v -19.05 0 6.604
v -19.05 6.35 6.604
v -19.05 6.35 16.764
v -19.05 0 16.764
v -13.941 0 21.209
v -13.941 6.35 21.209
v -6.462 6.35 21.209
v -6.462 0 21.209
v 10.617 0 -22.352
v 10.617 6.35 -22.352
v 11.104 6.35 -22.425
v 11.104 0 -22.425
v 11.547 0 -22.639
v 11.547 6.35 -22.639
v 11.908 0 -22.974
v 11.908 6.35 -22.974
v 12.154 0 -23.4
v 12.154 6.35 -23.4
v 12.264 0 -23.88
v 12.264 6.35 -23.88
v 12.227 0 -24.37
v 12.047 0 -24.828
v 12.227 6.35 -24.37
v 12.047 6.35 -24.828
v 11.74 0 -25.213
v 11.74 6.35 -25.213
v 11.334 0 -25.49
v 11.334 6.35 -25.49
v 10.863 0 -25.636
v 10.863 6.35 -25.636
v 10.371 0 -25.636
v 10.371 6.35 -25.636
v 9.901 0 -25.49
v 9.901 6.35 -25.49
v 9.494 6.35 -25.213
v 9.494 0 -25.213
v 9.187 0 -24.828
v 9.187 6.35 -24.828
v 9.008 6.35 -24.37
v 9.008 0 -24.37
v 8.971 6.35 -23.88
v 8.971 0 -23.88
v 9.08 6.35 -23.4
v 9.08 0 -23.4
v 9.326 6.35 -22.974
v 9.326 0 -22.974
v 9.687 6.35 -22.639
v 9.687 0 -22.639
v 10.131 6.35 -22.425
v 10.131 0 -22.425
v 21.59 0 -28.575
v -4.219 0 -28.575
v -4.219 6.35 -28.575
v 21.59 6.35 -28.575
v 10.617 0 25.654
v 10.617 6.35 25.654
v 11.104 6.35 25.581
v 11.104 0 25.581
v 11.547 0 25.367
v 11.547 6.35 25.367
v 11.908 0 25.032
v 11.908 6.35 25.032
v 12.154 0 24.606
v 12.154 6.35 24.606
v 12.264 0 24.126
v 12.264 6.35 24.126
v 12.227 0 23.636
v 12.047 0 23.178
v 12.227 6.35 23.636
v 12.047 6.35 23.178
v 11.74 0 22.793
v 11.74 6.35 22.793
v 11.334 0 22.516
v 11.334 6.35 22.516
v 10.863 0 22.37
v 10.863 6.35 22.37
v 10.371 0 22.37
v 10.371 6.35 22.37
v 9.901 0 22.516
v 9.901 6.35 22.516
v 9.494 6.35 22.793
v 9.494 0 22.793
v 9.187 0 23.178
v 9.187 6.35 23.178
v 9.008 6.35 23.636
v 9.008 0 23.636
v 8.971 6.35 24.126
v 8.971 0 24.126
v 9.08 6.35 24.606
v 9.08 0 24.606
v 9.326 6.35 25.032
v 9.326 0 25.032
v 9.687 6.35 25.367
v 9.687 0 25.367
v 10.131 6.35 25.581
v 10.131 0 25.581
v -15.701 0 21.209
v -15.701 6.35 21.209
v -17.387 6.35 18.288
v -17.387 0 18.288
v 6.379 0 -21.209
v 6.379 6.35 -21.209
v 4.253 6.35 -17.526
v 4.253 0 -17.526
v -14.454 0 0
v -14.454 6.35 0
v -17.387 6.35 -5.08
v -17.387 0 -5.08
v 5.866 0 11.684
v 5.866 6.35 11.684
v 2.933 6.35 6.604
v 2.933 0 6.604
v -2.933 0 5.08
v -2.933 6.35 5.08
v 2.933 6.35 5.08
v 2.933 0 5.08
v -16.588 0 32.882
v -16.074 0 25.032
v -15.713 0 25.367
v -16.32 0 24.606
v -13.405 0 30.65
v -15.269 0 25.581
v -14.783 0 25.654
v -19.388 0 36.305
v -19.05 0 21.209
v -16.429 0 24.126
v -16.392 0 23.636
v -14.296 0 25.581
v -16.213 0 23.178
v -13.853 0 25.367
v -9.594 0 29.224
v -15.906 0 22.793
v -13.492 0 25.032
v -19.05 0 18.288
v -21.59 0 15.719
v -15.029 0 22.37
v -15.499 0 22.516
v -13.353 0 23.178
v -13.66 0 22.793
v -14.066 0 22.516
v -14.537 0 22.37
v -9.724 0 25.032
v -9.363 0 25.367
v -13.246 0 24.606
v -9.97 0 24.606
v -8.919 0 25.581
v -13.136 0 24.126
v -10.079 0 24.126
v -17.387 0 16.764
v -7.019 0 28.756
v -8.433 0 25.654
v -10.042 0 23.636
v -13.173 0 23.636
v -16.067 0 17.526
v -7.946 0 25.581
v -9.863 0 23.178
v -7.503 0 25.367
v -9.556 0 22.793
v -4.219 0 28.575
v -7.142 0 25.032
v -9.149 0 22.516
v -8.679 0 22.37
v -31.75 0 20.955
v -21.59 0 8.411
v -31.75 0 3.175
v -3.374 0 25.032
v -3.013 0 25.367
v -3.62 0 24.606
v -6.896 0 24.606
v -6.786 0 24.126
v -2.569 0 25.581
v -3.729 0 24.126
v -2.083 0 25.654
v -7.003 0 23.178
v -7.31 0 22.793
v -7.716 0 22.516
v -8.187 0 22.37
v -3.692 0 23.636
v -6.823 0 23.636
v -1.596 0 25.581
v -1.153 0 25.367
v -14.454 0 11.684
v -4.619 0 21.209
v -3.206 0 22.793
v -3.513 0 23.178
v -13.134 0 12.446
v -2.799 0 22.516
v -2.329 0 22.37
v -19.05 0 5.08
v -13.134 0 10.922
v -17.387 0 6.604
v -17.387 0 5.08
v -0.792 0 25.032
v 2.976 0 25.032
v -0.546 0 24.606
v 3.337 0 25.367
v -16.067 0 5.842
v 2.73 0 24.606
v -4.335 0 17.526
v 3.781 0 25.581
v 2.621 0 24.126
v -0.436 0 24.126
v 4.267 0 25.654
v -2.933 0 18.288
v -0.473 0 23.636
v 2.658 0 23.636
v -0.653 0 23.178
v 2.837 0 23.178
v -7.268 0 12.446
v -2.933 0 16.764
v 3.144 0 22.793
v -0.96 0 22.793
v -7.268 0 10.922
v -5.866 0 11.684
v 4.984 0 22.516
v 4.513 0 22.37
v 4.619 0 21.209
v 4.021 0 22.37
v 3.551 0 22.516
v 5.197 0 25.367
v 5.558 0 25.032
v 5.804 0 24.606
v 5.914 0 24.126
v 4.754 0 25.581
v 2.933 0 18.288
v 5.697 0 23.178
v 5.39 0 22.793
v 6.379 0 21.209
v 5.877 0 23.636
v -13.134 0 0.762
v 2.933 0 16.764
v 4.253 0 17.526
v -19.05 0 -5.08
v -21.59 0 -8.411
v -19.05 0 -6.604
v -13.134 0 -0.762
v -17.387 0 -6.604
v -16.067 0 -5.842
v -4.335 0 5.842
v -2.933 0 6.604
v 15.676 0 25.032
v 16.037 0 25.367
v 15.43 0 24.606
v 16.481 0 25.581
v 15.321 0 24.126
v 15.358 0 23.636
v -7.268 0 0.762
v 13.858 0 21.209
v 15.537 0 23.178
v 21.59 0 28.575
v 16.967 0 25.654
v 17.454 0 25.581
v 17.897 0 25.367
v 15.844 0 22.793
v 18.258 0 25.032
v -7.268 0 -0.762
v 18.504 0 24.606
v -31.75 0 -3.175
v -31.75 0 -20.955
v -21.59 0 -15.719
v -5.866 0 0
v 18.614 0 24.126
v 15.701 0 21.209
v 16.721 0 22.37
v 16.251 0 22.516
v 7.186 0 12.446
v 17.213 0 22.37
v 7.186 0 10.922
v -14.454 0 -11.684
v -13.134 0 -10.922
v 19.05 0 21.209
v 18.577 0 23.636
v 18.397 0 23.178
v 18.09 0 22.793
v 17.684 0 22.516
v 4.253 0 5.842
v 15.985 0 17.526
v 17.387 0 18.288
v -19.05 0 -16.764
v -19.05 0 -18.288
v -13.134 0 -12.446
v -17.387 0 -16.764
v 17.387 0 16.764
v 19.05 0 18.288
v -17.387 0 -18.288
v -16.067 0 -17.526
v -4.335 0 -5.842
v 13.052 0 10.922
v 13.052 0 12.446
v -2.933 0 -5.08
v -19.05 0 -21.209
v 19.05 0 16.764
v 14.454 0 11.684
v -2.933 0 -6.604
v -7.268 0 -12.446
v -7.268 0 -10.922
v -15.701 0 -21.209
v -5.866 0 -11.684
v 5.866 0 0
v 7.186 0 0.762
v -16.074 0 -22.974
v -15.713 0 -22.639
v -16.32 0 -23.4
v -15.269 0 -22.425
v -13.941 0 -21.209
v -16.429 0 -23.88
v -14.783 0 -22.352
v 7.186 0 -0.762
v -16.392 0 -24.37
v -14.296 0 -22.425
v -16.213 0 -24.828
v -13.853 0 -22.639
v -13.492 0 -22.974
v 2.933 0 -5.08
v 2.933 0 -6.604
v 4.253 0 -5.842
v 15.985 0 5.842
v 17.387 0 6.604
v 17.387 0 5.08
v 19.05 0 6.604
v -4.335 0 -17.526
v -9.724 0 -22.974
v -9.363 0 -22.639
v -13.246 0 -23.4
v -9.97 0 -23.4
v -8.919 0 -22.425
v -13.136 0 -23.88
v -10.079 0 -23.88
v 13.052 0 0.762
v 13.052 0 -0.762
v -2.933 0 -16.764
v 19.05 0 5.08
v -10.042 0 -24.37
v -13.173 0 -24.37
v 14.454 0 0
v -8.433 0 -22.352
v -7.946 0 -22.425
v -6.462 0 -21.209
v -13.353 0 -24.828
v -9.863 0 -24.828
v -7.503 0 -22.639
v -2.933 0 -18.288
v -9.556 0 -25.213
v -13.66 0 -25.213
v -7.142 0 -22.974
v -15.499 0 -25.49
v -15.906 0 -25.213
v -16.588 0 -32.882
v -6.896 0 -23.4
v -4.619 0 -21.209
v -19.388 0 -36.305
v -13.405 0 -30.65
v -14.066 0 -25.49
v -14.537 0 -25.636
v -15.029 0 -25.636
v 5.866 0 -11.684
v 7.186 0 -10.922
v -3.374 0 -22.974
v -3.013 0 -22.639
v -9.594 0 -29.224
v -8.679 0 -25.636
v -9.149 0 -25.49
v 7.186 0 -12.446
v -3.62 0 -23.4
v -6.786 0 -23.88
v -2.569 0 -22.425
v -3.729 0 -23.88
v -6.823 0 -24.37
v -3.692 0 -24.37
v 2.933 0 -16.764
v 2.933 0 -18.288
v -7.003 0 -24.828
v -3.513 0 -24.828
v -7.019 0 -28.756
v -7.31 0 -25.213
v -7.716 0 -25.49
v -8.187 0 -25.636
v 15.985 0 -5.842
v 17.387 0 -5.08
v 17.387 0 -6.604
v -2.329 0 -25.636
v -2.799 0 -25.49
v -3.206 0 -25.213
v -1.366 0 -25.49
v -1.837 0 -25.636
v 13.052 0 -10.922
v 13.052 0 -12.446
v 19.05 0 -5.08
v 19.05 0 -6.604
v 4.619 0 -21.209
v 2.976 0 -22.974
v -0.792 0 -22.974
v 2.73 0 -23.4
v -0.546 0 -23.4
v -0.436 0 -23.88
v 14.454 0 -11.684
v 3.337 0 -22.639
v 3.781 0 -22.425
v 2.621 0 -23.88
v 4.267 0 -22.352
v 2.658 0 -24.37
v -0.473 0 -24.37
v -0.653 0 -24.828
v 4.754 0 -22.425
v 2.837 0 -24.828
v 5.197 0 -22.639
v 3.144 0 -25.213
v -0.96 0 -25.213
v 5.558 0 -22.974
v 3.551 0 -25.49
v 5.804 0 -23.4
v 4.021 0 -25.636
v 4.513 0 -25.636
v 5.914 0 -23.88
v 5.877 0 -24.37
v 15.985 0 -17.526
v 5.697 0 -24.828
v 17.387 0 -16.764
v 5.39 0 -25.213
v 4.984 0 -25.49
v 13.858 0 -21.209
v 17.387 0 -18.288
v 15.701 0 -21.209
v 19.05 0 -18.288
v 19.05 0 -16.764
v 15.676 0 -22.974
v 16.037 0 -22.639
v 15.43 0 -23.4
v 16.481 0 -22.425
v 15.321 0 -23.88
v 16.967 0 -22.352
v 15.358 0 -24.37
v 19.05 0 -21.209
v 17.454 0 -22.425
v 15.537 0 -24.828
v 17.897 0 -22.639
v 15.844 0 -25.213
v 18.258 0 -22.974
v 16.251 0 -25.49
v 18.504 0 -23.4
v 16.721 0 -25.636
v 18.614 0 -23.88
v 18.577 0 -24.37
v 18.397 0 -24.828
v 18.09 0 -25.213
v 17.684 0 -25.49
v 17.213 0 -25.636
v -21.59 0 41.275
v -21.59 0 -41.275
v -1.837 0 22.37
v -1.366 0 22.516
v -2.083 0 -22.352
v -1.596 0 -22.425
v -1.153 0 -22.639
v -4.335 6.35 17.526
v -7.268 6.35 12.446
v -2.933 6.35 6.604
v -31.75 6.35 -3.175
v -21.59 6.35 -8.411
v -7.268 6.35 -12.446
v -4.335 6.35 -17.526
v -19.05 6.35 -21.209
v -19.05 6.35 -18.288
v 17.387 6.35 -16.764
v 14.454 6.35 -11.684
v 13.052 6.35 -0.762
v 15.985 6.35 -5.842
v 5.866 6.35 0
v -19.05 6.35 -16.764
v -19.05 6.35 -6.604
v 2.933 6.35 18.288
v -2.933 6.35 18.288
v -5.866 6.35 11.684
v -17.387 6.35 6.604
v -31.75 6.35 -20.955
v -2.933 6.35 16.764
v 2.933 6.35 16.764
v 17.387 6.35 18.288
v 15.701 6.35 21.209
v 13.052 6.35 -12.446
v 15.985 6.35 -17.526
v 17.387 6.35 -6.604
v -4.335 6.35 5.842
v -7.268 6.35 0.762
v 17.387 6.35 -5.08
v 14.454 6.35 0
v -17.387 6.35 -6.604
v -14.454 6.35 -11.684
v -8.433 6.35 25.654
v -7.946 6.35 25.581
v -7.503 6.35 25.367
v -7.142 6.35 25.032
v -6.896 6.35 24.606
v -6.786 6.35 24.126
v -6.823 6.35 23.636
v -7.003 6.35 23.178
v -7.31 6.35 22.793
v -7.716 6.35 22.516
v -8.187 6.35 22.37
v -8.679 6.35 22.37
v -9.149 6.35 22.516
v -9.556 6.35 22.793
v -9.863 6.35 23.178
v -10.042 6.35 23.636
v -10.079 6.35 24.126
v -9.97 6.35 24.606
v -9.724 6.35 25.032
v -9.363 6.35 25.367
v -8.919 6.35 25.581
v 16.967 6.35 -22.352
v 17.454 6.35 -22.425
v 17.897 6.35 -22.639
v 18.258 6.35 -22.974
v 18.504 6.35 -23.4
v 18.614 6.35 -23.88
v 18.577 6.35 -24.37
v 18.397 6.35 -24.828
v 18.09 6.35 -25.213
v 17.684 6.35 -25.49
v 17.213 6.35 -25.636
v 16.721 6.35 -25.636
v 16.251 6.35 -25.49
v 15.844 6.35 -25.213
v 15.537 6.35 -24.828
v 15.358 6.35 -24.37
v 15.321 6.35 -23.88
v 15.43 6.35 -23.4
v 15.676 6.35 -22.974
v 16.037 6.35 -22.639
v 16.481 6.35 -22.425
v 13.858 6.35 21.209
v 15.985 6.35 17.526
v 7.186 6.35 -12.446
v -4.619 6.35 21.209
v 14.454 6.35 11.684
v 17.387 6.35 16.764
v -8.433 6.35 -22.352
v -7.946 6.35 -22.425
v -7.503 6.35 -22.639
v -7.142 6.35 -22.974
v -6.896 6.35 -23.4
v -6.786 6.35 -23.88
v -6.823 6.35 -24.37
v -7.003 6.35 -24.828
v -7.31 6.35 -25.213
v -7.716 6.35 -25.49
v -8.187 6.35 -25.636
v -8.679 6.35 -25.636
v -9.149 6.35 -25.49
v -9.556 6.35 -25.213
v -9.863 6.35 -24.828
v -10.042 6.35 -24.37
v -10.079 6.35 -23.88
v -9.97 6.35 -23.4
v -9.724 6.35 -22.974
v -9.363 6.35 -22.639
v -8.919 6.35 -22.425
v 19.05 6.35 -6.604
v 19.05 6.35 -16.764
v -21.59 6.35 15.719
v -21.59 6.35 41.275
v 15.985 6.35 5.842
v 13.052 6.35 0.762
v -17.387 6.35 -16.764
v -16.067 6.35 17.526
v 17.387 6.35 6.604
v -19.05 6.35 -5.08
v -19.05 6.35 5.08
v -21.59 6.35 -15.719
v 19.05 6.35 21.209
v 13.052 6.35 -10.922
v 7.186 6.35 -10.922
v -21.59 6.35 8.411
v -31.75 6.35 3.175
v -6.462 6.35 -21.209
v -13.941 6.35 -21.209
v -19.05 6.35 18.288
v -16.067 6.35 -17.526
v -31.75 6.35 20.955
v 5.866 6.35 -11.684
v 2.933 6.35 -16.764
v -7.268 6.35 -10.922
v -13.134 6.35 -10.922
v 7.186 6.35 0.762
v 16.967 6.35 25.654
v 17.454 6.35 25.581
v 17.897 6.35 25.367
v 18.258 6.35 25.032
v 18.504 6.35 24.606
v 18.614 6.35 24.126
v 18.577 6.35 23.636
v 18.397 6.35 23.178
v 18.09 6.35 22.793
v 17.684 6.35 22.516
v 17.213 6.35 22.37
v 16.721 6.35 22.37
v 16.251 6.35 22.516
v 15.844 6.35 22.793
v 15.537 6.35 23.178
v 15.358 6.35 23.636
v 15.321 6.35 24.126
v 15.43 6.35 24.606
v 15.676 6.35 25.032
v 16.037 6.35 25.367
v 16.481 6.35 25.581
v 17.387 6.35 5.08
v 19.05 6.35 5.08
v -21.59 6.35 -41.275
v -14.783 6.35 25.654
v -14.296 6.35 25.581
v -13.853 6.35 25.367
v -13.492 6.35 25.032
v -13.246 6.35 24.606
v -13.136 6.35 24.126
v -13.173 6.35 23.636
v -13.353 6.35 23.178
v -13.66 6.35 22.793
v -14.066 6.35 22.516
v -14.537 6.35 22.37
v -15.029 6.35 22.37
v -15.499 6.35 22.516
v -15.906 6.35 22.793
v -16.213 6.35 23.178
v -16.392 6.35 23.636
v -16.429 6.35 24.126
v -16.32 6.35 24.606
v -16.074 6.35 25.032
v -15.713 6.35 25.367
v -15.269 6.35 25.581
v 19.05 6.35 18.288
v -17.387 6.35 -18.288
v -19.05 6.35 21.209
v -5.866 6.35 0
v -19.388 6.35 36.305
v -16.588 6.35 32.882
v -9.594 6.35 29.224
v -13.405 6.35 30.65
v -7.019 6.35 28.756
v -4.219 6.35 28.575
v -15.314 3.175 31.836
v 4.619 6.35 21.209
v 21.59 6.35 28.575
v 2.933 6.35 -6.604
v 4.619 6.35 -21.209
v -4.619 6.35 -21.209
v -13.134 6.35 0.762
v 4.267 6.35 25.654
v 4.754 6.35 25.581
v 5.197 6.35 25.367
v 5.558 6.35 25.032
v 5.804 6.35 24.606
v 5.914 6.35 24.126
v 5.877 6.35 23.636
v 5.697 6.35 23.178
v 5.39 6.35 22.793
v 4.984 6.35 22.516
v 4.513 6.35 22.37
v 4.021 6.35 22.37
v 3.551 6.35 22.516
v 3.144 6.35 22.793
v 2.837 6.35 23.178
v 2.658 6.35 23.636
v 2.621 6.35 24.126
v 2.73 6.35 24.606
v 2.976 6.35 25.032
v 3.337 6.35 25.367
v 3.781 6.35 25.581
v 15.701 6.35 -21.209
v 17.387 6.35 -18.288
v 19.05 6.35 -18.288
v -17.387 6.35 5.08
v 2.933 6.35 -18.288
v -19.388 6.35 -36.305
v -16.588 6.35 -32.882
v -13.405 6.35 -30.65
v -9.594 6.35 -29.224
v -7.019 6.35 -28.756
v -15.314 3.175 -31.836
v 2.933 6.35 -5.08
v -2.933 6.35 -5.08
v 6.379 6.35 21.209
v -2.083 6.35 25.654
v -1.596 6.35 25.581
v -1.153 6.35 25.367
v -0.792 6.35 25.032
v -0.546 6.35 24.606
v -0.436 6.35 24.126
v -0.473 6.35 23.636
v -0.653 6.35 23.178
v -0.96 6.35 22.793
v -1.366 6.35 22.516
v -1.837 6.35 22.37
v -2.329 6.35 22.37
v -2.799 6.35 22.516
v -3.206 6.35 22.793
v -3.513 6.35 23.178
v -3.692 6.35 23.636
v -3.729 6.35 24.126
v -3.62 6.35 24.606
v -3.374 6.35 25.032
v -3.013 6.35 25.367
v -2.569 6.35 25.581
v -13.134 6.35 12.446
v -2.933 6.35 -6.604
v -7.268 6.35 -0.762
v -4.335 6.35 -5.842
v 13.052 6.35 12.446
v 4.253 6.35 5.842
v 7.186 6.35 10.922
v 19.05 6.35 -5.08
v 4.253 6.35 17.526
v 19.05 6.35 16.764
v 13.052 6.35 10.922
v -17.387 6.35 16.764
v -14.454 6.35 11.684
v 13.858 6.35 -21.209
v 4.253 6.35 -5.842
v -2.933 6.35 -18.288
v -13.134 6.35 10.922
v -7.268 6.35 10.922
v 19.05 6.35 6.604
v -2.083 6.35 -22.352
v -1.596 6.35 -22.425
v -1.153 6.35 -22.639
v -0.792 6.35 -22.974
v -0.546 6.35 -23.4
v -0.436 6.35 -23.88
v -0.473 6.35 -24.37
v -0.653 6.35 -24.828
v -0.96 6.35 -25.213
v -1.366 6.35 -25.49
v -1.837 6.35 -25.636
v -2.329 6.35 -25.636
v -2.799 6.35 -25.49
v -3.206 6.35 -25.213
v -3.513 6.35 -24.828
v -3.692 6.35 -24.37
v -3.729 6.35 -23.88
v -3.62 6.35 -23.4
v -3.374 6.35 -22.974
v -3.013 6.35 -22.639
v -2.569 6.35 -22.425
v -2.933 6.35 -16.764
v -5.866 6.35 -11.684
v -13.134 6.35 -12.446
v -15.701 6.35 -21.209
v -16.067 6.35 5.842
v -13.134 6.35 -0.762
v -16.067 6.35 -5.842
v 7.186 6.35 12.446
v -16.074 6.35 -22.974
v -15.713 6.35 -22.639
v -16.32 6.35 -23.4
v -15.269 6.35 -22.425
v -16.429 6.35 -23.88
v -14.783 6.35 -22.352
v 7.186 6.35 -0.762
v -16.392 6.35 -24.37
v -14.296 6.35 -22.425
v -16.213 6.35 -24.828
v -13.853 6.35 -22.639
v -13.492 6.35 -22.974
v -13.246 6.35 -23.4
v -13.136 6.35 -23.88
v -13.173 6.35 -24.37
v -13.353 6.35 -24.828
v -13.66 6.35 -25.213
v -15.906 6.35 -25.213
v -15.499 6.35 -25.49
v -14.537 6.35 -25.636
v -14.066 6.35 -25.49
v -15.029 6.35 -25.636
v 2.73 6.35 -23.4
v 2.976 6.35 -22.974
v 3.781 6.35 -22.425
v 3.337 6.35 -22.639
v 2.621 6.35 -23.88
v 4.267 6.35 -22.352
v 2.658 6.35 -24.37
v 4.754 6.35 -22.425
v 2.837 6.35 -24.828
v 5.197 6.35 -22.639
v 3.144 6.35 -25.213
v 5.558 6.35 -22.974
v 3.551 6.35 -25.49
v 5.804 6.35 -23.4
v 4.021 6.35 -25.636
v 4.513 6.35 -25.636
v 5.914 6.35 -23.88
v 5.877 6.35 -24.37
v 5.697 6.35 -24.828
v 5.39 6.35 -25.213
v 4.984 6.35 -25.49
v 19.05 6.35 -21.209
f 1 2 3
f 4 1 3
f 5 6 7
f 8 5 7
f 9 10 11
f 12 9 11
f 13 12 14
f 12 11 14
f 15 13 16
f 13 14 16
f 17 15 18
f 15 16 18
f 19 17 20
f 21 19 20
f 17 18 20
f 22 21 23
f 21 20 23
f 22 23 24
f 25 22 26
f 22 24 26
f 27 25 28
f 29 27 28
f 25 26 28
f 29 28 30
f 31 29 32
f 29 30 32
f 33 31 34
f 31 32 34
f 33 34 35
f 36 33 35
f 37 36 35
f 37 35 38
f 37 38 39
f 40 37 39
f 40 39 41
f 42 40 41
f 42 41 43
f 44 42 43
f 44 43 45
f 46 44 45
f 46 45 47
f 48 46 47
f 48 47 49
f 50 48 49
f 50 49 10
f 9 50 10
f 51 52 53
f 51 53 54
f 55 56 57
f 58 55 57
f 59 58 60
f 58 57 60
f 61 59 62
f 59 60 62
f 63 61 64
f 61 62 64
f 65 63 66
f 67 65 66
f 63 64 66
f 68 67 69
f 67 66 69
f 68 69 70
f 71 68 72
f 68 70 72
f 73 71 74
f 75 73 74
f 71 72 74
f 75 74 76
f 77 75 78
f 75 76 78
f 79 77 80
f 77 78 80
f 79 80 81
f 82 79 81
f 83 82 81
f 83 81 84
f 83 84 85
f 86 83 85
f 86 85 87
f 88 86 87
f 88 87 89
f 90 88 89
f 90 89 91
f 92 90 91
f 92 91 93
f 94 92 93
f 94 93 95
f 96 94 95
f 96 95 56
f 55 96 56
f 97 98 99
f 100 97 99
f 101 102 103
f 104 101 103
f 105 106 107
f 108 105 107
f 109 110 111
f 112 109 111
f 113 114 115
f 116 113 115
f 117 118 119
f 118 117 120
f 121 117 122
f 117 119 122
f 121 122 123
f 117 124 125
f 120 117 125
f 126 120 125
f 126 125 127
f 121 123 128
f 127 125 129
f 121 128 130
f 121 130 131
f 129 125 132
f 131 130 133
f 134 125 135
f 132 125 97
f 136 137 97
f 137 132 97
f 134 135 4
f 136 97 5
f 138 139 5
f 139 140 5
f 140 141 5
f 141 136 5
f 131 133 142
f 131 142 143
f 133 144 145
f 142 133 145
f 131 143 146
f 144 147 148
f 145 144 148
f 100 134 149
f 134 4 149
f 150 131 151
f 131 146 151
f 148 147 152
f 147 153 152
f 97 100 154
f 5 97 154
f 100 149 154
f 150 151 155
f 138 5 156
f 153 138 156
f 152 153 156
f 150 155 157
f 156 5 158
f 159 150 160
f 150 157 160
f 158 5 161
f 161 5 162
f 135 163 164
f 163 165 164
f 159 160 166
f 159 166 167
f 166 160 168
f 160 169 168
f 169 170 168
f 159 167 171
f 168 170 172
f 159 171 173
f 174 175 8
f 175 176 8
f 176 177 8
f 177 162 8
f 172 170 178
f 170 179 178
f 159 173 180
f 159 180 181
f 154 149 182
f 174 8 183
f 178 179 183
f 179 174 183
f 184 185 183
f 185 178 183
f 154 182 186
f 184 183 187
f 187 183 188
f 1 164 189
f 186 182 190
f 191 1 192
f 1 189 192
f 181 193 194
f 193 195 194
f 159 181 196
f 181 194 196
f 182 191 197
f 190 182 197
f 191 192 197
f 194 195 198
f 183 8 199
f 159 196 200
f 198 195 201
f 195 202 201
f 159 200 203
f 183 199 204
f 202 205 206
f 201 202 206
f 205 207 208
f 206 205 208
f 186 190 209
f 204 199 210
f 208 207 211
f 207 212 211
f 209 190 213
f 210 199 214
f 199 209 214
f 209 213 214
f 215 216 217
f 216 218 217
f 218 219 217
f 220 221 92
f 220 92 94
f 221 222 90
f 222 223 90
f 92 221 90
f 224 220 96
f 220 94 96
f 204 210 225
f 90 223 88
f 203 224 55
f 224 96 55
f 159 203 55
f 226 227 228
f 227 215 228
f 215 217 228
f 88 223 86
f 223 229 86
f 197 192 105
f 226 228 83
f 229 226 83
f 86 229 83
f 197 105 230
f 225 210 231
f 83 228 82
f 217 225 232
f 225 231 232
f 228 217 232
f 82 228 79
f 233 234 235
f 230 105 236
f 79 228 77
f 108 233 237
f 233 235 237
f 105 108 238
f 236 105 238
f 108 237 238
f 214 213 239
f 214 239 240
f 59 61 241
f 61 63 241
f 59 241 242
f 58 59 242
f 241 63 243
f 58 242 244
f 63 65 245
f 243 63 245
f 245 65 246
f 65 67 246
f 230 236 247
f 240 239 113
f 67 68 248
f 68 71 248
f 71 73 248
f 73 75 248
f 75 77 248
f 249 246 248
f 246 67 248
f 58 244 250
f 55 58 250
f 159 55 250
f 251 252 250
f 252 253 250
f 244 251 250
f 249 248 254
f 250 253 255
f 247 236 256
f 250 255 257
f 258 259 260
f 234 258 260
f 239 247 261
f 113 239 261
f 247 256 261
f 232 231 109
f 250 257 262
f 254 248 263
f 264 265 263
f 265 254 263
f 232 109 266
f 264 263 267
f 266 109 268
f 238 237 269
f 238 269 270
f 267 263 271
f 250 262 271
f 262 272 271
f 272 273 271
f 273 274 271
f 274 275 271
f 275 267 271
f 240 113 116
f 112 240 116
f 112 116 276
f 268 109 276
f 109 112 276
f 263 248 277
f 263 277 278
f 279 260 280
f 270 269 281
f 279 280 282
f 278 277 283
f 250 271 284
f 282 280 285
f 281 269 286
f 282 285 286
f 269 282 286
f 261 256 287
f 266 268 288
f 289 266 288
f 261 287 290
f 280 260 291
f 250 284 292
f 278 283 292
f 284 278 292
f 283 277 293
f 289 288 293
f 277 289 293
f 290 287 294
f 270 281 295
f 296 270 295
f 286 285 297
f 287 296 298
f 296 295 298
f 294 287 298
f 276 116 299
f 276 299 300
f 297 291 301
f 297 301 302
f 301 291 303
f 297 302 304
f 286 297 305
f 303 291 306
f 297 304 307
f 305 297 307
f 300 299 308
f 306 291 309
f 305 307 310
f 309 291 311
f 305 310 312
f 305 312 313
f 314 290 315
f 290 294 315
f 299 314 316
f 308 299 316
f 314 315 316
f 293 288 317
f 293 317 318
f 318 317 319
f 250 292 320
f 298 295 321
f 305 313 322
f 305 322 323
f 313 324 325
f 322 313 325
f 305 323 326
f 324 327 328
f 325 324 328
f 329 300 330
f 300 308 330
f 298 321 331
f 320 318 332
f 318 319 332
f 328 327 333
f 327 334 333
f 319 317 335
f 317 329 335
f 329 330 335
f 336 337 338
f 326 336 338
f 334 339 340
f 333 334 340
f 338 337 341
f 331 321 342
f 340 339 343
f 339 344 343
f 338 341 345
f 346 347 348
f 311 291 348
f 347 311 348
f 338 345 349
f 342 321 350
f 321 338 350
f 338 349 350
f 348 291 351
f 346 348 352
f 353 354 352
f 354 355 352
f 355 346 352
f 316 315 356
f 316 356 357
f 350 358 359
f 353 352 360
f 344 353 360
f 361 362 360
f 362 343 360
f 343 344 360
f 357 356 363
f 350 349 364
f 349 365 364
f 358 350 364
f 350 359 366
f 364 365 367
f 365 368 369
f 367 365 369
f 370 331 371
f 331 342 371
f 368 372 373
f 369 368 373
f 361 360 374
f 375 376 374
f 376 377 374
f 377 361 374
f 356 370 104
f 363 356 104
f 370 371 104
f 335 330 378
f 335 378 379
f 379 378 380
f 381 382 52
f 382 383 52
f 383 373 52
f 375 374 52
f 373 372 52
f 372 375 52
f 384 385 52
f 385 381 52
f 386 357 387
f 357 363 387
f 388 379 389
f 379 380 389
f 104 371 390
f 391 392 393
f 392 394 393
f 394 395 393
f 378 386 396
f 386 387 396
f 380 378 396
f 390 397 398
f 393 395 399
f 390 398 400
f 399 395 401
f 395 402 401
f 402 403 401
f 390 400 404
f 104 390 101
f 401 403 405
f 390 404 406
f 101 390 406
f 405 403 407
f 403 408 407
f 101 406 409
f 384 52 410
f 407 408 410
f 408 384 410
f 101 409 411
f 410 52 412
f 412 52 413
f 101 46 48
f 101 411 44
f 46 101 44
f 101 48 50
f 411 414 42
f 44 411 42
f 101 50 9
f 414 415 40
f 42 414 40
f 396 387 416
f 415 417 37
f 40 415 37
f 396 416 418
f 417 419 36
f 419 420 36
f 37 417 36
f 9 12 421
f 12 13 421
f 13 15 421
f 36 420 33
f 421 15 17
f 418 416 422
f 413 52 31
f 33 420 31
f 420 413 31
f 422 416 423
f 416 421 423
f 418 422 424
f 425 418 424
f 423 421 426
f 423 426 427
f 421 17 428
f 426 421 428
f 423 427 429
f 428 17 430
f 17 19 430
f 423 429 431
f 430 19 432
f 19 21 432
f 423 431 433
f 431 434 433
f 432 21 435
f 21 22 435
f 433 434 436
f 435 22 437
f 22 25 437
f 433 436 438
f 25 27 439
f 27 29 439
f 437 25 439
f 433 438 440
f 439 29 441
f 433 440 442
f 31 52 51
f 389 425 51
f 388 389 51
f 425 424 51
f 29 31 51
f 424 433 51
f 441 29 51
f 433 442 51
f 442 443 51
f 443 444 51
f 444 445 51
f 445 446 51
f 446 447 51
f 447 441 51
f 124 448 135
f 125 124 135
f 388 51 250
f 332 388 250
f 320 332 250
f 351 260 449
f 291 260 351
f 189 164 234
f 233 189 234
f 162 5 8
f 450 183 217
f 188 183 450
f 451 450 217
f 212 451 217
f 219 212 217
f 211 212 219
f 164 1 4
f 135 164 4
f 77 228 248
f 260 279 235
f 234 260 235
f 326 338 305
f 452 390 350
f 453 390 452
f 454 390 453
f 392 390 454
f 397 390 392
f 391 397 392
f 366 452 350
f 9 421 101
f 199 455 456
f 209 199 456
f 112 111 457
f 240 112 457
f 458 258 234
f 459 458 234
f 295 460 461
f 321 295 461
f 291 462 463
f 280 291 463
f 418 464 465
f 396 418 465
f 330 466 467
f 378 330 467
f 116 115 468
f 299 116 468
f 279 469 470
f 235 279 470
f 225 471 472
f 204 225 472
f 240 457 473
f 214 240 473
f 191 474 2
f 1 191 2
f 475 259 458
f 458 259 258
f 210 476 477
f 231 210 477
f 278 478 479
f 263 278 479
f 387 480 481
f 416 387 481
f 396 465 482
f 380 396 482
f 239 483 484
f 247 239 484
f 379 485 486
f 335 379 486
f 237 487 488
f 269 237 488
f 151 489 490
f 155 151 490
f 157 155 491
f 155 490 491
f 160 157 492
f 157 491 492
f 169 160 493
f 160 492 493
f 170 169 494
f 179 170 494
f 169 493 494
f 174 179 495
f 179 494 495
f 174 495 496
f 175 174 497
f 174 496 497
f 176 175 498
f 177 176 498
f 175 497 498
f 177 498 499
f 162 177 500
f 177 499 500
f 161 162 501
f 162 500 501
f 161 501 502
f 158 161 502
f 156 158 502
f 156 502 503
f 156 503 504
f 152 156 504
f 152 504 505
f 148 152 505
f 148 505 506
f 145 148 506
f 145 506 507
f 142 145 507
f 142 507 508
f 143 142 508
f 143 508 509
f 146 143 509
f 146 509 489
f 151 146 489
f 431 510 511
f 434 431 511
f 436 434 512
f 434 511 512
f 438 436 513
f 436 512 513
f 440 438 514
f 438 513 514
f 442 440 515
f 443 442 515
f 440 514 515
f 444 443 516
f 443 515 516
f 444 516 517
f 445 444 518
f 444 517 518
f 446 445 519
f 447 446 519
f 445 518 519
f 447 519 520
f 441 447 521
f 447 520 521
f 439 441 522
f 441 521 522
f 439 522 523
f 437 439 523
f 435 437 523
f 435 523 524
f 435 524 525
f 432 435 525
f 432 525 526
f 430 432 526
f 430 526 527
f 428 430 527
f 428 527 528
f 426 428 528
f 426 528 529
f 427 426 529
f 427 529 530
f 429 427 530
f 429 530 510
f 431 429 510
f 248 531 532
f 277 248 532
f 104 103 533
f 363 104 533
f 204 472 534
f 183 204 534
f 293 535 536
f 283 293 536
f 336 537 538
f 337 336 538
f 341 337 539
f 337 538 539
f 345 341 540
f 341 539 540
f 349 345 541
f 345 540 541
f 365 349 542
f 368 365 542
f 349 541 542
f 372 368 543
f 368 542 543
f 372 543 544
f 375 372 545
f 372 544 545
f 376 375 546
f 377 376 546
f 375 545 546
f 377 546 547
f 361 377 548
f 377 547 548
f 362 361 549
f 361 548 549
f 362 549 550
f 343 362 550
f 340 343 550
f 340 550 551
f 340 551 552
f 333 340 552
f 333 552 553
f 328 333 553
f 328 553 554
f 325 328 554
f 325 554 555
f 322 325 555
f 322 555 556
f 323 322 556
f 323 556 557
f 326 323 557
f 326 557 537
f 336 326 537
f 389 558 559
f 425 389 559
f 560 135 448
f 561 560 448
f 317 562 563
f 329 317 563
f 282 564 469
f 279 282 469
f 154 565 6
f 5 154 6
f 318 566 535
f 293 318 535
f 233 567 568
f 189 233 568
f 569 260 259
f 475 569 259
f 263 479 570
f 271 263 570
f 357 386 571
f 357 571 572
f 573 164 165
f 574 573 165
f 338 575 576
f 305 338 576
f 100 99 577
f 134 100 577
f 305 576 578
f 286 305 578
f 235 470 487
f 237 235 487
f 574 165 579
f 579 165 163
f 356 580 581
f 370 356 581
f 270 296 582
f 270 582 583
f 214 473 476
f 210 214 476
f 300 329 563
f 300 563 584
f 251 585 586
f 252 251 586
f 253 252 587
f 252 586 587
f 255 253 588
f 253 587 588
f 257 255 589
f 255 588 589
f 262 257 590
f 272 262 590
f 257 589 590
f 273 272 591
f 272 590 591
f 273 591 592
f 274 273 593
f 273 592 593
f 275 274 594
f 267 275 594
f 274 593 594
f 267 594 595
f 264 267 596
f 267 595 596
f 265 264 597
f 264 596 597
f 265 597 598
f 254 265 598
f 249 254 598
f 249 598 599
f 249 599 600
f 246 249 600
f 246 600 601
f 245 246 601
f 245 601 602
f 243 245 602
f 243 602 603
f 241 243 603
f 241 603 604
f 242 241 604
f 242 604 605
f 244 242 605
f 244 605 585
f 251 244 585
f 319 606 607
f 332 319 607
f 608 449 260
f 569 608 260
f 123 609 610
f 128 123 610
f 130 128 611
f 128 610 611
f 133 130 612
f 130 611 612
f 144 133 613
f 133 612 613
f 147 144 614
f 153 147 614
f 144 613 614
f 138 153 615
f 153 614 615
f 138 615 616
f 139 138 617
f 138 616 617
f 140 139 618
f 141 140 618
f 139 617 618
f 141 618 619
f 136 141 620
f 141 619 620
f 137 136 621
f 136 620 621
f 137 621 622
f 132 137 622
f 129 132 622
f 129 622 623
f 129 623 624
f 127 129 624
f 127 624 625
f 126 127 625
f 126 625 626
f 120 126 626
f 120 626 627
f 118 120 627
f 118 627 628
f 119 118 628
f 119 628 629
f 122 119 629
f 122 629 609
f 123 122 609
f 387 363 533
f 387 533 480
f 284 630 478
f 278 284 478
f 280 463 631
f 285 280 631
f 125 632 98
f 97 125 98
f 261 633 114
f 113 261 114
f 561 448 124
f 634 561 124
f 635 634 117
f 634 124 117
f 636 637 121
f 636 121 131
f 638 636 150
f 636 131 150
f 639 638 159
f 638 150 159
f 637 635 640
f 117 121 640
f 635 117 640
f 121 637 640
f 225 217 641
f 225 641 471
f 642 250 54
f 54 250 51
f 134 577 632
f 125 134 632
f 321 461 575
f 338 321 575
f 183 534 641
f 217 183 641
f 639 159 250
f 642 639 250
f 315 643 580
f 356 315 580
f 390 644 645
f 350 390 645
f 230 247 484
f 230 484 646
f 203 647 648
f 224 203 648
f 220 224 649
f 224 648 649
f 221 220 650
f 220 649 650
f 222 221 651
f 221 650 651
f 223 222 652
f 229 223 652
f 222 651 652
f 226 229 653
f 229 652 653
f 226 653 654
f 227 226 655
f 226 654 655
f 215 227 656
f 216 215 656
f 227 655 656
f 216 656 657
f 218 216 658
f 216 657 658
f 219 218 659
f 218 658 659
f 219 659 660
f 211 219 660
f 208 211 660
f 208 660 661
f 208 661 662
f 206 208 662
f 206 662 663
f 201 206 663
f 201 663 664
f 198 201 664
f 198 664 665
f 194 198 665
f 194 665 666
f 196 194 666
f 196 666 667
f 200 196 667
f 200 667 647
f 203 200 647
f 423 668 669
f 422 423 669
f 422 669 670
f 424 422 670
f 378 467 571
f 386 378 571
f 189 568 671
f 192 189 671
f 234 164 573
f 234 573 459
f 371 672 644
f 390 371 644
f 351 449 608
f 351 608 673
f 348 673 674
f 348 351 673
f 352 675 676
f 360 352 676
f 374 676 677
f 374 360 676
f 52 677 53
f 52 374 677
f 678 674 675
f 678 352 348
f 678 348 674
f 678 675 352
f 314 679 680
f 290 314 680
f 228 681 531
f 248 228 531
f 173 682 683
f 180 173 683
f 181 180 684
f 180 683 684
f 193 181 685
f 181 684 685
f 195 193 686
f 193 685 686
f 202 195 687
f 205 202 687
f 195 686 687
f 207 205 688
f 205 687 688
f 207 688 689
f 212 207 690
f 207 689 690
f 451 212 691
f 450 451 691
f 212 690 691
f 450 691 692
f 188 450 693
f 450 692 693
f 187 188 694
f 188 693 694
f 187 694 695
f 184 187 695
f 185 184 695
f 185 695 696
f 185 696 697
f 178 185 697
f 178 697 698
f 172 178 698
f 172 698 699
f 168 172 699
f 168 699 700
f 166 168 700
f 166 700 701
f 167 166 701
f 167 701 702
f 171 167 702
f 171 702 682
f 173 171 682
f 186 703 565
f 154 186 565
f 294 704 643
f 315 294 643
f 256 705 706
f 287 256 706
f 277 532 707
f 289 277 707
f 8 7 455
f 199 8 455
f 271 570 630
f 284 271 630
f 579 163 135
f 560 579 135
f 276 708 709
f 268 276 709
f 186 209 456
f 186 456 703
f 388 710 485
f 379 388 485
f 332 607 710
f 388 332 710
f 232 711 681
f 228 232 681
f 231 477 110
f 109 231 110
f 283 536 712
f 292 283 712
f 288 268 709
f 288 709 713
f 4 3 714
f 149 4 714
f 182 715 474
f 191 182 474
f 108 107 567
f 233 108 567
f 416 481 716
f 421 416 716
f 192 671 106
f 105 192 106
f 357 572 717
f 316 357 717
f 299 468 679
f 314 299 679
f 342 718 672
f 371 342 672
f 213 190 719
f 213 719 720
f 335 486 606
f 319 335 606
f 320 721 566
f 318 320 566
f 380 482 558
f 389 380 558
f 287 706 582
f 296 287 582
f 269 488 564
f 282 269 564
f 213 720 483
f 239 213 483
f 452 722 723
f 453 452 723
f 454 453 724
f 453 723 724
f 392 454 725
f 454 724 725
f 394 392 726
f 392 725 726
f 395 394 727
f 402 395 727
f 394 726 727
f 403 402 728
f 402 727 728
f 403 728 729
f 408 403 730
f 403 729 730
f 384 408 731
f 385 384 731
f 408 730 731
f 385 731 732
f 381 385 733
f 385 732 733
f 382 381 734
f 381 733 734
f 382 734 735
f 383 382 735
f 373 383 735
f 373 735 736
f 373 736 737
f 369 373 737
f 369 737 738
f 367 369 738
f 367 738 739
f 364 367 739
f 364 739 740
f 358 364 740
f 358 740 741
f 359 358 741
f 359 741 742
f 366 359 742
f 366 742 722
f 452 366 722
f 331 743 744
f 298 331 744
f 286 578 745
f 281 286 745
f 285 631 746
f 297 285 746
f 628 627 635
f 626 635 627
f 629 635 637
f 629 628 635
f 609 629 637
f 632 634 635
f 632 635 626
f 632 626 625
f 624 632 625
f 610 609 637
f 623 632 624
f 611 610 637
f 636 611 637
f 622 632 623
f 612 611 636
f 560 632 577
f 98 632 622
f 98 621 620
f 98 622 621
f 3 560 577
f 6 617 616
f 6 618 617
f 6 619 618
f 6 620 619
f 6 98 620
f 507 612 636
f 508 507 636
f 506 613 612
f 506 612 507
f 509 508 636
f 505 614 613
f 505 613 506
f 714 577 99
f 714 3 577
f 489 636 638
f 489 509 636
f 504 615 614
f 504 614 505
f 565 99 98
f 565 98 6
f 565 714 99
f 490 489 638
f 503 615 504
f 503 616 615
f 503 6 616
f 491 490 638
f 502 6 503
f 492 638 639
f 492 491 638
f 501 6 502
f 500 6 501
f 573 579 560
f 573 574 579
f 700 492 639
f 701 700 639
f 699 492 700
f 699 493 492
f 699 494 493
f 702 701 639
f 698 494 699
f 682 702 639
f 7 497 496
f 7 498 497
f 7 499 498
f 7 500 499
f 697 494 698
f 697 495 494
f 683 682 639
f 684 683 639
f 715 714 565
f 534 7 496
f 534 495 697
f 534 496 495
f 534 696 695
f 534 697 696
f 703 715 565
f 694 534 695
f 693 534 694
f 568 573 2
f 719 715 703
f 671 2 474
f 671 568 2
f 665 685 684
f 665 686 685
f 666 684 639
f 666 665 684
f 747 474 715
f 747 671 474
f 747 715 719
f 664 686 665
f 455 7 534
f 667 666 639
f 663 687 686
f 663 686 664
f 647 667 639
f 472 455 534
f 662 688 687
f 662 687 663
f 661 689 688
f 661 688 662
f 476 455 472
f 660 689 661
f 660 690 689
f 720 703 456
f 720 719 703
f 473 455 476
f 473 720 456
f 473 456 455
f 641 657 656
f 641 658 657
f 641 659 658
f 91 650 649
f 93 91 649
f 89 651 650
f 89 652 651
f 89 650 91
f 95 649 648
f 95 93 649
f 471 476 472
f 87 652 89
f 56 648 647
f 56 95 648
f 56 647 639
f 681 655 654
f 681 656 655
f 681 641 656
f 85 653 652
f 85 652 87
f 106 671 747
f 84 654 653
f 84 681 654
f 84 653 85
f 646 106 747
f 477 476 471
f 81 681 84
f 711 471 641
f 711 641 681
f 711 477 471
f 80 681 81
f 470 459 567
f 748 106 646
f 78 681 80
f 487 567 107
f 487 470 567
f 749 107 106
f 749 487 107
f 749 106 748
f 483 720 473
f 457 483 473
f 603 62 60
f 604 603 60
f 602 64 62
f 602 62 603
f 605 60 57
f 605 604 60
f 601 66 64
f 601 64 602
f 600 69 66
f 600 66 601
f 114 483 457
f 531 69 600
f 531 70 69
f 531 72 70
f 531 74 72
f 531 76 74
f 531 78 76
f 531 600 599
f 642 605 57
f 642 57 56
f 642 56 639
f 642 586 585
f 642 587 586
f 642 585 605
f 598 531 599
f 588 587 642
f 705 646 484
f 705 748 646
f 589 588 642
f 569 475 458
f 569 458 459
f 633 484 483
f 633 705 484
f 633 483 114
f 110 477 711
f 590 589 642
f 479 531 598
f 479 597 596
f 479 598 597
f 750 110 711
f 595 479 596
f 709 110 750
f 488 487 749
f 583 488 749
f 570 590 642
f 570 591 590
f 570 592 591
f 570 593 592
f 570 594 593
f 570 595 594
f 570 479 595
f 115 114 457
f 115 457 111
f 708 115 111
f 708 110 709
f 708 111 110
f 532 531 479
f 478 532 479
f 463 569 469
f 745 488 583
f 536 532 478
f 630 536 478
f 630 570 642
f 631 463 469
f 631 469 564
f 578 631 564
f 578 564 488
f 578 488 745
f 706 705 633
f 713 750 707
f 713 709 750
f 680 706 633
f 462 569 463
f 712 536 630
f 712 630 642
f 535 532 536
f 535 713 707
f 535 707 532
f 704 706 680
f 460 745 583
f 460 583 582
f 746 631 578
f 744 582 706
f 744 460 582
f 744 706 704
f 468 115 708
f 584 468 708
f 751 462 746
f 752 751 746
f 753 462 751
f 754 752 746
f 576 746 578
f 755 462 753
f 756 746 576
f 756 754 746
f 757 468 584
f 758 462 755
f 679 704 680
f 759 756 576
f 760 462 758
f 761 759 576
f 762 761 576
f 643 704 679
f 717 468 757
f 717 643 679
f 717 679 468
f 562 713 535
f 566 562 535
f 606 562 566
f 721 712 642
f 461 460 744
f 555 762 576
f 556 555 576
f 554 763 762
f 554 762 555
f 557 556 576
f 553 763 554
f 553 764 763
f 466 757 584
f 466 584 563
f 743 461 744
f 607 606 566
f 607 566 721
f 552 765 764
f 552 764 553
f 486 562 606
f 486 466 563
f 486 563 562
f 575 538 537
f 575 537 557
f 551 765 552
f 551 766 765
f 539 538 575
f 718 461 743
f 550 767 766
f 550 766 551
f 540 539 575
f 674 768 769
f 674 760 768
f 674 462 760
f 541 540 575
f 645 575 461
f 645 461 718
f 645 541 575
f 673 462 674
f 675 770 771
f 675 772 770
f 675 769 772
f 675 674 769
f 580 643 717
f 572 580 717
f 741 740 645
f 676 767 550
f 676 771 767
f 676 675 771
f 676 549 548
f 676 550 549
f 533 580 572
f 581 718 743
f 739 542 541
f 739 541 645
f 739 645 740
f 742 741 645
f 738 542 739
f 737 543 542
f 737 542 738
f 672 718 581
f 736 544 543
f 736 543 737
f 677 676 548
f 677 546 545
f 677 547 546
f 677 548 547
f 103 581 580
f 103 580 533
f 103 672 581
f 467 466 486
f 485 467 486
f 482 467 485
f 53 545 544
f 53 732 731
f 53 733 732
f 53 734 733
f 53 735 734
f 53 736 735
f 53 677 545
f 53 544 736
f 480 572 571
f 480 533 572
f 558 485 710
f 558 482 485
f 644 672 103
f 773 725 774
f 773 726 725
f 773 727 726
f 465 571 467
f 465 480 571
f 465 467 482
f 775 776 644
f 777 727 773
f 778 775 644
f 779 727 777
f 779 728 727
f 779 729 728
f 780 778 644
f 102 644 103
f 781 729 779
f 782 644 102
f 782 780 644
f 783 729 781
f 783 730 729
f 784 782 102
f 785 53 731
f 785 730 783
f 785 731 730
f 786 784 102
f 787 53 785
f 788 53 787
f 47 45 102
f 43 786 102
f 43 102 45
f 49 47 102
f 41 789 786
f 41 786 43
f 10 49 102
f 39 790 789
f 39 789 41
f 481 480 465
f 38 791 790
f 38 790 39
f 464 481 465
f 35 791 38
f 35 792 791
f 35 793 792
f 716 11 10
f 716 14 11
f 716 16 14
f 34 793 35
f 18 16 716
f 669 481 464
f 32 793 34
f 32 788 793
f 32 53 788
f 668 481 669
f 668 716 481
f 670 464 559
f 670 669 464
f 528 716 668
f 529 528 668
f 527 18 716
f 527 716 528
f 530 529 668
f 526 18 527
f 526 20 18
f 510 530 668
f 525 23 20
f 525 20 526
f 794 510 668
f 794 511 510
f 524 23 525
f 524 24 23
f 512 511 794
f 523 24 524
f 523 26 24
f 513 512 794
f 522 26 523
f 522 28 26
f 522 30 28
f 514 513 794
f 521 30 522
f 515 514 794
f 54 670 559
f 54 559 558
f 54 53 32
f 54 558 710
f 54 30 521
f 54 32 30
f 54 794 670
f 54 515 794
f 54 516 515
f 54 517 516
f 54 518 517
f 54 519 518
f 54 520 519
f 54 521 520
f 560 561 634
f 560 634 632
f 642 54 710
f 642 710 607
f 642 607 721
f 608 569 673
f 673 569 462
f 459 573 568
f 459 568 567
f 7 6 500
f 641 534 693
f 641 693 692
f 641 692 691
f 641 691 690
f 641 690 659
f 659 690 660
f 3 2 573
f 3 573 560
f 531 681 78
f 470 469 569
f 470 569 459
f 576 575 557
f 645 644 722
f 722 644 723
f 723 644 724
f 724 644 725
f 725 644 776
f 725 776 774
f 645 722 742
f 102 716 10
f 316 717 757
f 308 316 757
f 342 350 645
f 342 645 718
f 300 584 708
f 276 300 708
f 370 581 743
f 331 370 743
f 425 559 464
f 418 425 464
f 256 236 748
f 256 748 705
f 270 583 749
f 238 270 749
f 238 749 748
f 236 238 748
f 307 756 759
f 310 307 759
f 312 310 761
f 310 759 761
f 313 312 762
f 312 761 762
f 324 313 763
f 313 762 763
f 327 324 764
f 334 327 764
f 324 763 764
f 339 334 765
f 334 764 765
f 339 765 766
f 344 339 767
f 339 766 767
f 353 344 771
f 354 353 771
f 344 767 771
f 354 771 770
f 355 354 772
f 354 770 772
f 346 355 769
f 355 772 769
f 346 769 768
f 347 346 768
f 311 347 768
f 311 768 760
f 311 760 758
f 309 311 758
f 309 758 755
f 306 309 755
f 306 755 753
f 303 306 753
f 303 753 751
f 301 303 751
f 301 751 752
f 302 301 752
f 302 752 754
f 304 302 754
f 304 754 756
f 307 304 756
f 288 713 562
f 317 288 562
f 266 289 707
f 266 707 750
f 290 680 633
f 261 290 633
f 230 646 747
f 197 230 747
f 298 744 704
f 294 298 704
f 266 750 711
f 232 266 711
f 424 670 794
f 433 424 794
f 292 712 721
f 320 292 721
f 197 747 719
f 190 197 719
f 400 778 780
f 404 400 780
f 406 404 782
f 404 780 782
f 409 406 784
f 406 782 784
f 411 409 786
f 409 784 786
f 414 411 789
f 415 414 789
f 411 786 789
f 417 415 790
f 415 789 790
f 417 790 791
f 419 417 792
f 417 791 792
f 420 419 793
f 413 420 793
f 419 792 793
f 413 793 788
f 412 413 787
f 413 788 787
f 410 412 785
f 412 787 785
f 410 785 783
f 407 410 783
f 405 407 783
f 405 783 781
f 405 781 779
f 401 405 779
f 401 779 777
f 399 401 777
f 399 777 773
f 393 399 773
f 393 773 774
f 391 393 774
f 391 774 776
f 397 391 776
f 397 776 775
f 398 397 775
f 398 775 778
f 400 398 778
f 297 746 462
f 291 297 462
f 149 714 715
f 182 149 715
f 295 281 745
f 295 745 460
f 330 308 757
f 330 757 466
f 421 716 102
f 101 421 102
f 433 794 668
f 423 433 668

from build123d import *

# Parameters (mm, degrees)
SKETCH1_W           = 43.18
SKETCH1_H           = 57.15
BOSS_EXTRUDE1_DEPTH = 6.35
SKETCH2_R           = 1.651
CUT_EXTRUDE1_DEPTH  = 53.459609614
CUT_EXTRUDE2_DEPTH  = 53.459609614


with BuildPart() as part:
    # Sketch1 → Boss-Extrude1 (new body)
    with BuildSketch(Plane(origin=(0, 0, 0), x_dir=(1, 0, 0), z_dir=(0, 1, 0))):
        Polygon((-31.75, -20.955), (-21.59, -15.718655855), (-21.59, -8.411344145), (-31.75, -3.175), align=None)
        Rectangle(SKETCH1_W, SKETCH1_H)
        Polygon((-31.75, 3.175), (-21.59, 8.411344145), (-21.59, 15.718655855), (-31.75, 20.955), align=None)
        with BuildLine():
            Line((-4.218626538, -28.575), (-21.59, -28.575))
            Line((-21.59, -28.575), (-21.59, -41.275))
            add(Edge.make_bspline(
                [(-21.59, -41.275), (-17.723032693, -28.747286936), (-4.218626538, -28.575)],
                knots=[0, 0, 0, 0.972868199, 0.972868199, 0.972868199], degree=2))
        make_face()
        with BuildLine():
            Line((-21.59, 41.275), (-21.59, 28.575))
            Line((-21.59, 28.575), (-4.218626538, 28.575))
            add(Edge.make_bspline(
                [(-21.59, 41.275), (-17.723032693, 28.747286936), (-4.218626538, 28.575)],
                knots=[0, 0, 0, 0.972868199, 0.972868199, 0.972868199], degree=2))
        make_face()
    extrude(amount=BOSS_EXTRUDE1_DEPTH)

    # Sketch2 → Cut-Extrude1 (cut, through all)
    with BuildSketch(Plane(origin=(0, 6.35, 0), x_dir=(1, 0, 0), z_dir=(0, 1, 0))):
        with Locations(Location((4.2672, 24.003, 0), (0, 0, 270))):
            Circle(SKETCH2_R)
        with Locations(Location((4.2672, -24.003, 0), (0, 0, 270))):
            Circle(SKETCH2_R)
        with Locations(Location((10.6172, 24.003, 0), (0, 0, 270))):
            Circle(SKETCH2_R)
        with Locations(Location((10.6172, -24.003, 0), (0, 0, 270))):
            Circle(SKETCH2_R)
        with Locations(Location((16.9672, 24.003, 0), (0, 0, 270))):
            Circle(SKETCH2_R)
        with Locations(Location((16.9672, -24.003, 0), (0, 0, 270))):
            Circle(SKETCH2_R)
        with Locations(Location((-2.0828, 24.003, 0), (0, 0, 270))):
            Circle(SKETCH2_R)
        with Locations(Location((-2.0828, -24.003, 0), (0, 0, 270))):
            Circle(SKETCH2_R)
        with Locations(Location((-8.4328, 24.003, 0), (0, 0, 270))):
            Circle(SKETCH2_R)
        with Locations(Location((-8.4328, -24.003, 0), (0, 0, 270))):
            Circle(SKETCH2_R)
        with Locations(Location((-14.7828, 24.003, 0), (0, 0, 270))):
            Circle(SKETCH2_R)
        with Locations(Location((-14.7828, -24.003, 0), (0, 0, 270))):
            Circle(SKETCH2_R)
    extrude(amount=-CUT_EXTRUDE1_DEPTH, mode=Mode.SUBTRACT)

    # Sketch3 → Cut-Extrude2 (cut, through all)
    with BuildSketch(Plane(origin=(0, 6.35, 0), x_dir=(1, 0, 0), z_dir=(0, 1, 0))):
        Polygon((-17.387060633, 18.288), (-15.700620496, 21.209), (-19.05, 21.209), (-19.05, 18.288), align=None)
        Polygon((-4.335480447, 17.526), (-6.461861489, 21.209), (-13.940856876, 21.209), (-16.067237917, 17.526), (-13.13429855, 12.446), (-7.268419815, 12.446), align=None)
        Polygon((-17.387060633, 16.764), (-19.05, 16.764), (-19.05, 6.604), (-17.387060633, 6.604), (-14.454121265, 11.684), align=None)
        Polygon((-16.067237917, 5.842), (-13.13429855, 0.762), (-7.268419815, 0.762), (-4.335480447, 5.842), (-7.268419815, 10.922), (-13.13429855, 10.922), align=None)
        Polygon((-17.387060633, 5.08), (-19.05, 5.08), (-19.05, -5.08), (-17.387060633, -5.08), (-14.454121265, 0), align=None)
        Polygon((-16.067237917, -5.842), (-13.13429855, -10.922), (-7.268419815, -10.922), (-4.335480447, -5.842), (-7.268419815, -0.762), (-13.13429855, -0.762), align=None)
        Polygon((-19.05, -6.604), (-19.05, -16.764), (-17.387060633, -16.764), (-14.454121265, -11.684), (-17.387060633, -6.604), align=None)
        Polygon((-13.940856876, -21.209), (-6.461861489, -21.209), (-4.335480447, -17.526), (-7.268419815, -12.446), (-13.13429855, -12.446), (-16.067237917, -17.526), align=None)
        Polygon((-19.05, -21.209), (-15.700620496, -21.209), (-17.387060633, -18.288), (-19.05, -18.288), align=None)
        Polygon((-4.619379504, -21.209), (4.619379504, -21.209), (2.932939367, -18.288), (-2.932939367, -18.288), align=None)
        Polygon((-2.932939367, -16.764), (2.932939367, -16.764), (5.865878735, -11.684), (2.932939367, -6.604), (-2.932939367, -6.604), (-5.865878735, -11.684), align=None)
        Polygon((-2.932939367, -5.08), (2.932939367, -5.08), (5.865878735, 0), (2.932939367, 5.08), (-2.932939367, 5.08), (-5.865878735, 0), align=None)
        Polygon((-2.932939367, 6.604), (2.932939367, 6.604), (5.865878735, 11.684), (2.932939367, 16.764), (-2.932939367, 16.764), (-5.865878735, 11.684), align=None)
        Polygon((2.932939367, 18.288), (4.619379504, 21.209), (-4.619379504, 21.209), (-2.932939367, 18.288), align=None)
        Polygon((15.984519553, 17.526), (13.858138511, 21.209), (6.379143124, 21.209), (4.252762083, 17.526), (7.18570145, 12.446), (13.051580185, 12.446), align=None)
        Polygon((17.387060633, 18.288), (19.05, 18.288), (19.05, 21.209), (15.700620496, 21.209), align=None)
        Polygon((17.387060633, 6.604), (19.05, 6.604), (19.05, 16.764), (17.387060633, 16.764), (14.454121265, 11.684), align=None)
        Polygon((4.252762083, 5.842), (7.18570145, 0.762), (13.051580185, 0.762), (15.984519553, 5.842), (13.051580185, 10.922), (7.18570145, 10.922), align=None)
        Polygon((19.05, -5.08), (19.05, 5.08), (17.387060633, 5.08), (14.454121265, 0), (17.387060633, -5.08), align=None)
        Polygon((4.252762083, -5.842), (7.18570145, -10.922), (13.051580185, -10.922), (15.984519553, -5.842), (13.051580185, -0.762), (7.18570145, -0.762), align=None)
        Polygon((19.05, -16.764), (19.05, -6.604), (17.387060633, -6.604), (14.454121265, -11.684), (17.387060633, -16.764), align=None)
        Polygon((6.379143124, -21.209), (13.858138511, -21.209), (15.984519553, -17.526), (13.051580185, -12.446), (7.18570145, -12.446), (4.252762083, -17.526), align=None)
        Polygon((19.05, -21.209), (19.05, -18.288), (17.387060633, -18.288), (15.700620496, -21.209), align=None)
    extrude(amount=-CUT_EXTRUDE2_DEPTH, mode=Mode.SUBTRACT)


solid = part.part
